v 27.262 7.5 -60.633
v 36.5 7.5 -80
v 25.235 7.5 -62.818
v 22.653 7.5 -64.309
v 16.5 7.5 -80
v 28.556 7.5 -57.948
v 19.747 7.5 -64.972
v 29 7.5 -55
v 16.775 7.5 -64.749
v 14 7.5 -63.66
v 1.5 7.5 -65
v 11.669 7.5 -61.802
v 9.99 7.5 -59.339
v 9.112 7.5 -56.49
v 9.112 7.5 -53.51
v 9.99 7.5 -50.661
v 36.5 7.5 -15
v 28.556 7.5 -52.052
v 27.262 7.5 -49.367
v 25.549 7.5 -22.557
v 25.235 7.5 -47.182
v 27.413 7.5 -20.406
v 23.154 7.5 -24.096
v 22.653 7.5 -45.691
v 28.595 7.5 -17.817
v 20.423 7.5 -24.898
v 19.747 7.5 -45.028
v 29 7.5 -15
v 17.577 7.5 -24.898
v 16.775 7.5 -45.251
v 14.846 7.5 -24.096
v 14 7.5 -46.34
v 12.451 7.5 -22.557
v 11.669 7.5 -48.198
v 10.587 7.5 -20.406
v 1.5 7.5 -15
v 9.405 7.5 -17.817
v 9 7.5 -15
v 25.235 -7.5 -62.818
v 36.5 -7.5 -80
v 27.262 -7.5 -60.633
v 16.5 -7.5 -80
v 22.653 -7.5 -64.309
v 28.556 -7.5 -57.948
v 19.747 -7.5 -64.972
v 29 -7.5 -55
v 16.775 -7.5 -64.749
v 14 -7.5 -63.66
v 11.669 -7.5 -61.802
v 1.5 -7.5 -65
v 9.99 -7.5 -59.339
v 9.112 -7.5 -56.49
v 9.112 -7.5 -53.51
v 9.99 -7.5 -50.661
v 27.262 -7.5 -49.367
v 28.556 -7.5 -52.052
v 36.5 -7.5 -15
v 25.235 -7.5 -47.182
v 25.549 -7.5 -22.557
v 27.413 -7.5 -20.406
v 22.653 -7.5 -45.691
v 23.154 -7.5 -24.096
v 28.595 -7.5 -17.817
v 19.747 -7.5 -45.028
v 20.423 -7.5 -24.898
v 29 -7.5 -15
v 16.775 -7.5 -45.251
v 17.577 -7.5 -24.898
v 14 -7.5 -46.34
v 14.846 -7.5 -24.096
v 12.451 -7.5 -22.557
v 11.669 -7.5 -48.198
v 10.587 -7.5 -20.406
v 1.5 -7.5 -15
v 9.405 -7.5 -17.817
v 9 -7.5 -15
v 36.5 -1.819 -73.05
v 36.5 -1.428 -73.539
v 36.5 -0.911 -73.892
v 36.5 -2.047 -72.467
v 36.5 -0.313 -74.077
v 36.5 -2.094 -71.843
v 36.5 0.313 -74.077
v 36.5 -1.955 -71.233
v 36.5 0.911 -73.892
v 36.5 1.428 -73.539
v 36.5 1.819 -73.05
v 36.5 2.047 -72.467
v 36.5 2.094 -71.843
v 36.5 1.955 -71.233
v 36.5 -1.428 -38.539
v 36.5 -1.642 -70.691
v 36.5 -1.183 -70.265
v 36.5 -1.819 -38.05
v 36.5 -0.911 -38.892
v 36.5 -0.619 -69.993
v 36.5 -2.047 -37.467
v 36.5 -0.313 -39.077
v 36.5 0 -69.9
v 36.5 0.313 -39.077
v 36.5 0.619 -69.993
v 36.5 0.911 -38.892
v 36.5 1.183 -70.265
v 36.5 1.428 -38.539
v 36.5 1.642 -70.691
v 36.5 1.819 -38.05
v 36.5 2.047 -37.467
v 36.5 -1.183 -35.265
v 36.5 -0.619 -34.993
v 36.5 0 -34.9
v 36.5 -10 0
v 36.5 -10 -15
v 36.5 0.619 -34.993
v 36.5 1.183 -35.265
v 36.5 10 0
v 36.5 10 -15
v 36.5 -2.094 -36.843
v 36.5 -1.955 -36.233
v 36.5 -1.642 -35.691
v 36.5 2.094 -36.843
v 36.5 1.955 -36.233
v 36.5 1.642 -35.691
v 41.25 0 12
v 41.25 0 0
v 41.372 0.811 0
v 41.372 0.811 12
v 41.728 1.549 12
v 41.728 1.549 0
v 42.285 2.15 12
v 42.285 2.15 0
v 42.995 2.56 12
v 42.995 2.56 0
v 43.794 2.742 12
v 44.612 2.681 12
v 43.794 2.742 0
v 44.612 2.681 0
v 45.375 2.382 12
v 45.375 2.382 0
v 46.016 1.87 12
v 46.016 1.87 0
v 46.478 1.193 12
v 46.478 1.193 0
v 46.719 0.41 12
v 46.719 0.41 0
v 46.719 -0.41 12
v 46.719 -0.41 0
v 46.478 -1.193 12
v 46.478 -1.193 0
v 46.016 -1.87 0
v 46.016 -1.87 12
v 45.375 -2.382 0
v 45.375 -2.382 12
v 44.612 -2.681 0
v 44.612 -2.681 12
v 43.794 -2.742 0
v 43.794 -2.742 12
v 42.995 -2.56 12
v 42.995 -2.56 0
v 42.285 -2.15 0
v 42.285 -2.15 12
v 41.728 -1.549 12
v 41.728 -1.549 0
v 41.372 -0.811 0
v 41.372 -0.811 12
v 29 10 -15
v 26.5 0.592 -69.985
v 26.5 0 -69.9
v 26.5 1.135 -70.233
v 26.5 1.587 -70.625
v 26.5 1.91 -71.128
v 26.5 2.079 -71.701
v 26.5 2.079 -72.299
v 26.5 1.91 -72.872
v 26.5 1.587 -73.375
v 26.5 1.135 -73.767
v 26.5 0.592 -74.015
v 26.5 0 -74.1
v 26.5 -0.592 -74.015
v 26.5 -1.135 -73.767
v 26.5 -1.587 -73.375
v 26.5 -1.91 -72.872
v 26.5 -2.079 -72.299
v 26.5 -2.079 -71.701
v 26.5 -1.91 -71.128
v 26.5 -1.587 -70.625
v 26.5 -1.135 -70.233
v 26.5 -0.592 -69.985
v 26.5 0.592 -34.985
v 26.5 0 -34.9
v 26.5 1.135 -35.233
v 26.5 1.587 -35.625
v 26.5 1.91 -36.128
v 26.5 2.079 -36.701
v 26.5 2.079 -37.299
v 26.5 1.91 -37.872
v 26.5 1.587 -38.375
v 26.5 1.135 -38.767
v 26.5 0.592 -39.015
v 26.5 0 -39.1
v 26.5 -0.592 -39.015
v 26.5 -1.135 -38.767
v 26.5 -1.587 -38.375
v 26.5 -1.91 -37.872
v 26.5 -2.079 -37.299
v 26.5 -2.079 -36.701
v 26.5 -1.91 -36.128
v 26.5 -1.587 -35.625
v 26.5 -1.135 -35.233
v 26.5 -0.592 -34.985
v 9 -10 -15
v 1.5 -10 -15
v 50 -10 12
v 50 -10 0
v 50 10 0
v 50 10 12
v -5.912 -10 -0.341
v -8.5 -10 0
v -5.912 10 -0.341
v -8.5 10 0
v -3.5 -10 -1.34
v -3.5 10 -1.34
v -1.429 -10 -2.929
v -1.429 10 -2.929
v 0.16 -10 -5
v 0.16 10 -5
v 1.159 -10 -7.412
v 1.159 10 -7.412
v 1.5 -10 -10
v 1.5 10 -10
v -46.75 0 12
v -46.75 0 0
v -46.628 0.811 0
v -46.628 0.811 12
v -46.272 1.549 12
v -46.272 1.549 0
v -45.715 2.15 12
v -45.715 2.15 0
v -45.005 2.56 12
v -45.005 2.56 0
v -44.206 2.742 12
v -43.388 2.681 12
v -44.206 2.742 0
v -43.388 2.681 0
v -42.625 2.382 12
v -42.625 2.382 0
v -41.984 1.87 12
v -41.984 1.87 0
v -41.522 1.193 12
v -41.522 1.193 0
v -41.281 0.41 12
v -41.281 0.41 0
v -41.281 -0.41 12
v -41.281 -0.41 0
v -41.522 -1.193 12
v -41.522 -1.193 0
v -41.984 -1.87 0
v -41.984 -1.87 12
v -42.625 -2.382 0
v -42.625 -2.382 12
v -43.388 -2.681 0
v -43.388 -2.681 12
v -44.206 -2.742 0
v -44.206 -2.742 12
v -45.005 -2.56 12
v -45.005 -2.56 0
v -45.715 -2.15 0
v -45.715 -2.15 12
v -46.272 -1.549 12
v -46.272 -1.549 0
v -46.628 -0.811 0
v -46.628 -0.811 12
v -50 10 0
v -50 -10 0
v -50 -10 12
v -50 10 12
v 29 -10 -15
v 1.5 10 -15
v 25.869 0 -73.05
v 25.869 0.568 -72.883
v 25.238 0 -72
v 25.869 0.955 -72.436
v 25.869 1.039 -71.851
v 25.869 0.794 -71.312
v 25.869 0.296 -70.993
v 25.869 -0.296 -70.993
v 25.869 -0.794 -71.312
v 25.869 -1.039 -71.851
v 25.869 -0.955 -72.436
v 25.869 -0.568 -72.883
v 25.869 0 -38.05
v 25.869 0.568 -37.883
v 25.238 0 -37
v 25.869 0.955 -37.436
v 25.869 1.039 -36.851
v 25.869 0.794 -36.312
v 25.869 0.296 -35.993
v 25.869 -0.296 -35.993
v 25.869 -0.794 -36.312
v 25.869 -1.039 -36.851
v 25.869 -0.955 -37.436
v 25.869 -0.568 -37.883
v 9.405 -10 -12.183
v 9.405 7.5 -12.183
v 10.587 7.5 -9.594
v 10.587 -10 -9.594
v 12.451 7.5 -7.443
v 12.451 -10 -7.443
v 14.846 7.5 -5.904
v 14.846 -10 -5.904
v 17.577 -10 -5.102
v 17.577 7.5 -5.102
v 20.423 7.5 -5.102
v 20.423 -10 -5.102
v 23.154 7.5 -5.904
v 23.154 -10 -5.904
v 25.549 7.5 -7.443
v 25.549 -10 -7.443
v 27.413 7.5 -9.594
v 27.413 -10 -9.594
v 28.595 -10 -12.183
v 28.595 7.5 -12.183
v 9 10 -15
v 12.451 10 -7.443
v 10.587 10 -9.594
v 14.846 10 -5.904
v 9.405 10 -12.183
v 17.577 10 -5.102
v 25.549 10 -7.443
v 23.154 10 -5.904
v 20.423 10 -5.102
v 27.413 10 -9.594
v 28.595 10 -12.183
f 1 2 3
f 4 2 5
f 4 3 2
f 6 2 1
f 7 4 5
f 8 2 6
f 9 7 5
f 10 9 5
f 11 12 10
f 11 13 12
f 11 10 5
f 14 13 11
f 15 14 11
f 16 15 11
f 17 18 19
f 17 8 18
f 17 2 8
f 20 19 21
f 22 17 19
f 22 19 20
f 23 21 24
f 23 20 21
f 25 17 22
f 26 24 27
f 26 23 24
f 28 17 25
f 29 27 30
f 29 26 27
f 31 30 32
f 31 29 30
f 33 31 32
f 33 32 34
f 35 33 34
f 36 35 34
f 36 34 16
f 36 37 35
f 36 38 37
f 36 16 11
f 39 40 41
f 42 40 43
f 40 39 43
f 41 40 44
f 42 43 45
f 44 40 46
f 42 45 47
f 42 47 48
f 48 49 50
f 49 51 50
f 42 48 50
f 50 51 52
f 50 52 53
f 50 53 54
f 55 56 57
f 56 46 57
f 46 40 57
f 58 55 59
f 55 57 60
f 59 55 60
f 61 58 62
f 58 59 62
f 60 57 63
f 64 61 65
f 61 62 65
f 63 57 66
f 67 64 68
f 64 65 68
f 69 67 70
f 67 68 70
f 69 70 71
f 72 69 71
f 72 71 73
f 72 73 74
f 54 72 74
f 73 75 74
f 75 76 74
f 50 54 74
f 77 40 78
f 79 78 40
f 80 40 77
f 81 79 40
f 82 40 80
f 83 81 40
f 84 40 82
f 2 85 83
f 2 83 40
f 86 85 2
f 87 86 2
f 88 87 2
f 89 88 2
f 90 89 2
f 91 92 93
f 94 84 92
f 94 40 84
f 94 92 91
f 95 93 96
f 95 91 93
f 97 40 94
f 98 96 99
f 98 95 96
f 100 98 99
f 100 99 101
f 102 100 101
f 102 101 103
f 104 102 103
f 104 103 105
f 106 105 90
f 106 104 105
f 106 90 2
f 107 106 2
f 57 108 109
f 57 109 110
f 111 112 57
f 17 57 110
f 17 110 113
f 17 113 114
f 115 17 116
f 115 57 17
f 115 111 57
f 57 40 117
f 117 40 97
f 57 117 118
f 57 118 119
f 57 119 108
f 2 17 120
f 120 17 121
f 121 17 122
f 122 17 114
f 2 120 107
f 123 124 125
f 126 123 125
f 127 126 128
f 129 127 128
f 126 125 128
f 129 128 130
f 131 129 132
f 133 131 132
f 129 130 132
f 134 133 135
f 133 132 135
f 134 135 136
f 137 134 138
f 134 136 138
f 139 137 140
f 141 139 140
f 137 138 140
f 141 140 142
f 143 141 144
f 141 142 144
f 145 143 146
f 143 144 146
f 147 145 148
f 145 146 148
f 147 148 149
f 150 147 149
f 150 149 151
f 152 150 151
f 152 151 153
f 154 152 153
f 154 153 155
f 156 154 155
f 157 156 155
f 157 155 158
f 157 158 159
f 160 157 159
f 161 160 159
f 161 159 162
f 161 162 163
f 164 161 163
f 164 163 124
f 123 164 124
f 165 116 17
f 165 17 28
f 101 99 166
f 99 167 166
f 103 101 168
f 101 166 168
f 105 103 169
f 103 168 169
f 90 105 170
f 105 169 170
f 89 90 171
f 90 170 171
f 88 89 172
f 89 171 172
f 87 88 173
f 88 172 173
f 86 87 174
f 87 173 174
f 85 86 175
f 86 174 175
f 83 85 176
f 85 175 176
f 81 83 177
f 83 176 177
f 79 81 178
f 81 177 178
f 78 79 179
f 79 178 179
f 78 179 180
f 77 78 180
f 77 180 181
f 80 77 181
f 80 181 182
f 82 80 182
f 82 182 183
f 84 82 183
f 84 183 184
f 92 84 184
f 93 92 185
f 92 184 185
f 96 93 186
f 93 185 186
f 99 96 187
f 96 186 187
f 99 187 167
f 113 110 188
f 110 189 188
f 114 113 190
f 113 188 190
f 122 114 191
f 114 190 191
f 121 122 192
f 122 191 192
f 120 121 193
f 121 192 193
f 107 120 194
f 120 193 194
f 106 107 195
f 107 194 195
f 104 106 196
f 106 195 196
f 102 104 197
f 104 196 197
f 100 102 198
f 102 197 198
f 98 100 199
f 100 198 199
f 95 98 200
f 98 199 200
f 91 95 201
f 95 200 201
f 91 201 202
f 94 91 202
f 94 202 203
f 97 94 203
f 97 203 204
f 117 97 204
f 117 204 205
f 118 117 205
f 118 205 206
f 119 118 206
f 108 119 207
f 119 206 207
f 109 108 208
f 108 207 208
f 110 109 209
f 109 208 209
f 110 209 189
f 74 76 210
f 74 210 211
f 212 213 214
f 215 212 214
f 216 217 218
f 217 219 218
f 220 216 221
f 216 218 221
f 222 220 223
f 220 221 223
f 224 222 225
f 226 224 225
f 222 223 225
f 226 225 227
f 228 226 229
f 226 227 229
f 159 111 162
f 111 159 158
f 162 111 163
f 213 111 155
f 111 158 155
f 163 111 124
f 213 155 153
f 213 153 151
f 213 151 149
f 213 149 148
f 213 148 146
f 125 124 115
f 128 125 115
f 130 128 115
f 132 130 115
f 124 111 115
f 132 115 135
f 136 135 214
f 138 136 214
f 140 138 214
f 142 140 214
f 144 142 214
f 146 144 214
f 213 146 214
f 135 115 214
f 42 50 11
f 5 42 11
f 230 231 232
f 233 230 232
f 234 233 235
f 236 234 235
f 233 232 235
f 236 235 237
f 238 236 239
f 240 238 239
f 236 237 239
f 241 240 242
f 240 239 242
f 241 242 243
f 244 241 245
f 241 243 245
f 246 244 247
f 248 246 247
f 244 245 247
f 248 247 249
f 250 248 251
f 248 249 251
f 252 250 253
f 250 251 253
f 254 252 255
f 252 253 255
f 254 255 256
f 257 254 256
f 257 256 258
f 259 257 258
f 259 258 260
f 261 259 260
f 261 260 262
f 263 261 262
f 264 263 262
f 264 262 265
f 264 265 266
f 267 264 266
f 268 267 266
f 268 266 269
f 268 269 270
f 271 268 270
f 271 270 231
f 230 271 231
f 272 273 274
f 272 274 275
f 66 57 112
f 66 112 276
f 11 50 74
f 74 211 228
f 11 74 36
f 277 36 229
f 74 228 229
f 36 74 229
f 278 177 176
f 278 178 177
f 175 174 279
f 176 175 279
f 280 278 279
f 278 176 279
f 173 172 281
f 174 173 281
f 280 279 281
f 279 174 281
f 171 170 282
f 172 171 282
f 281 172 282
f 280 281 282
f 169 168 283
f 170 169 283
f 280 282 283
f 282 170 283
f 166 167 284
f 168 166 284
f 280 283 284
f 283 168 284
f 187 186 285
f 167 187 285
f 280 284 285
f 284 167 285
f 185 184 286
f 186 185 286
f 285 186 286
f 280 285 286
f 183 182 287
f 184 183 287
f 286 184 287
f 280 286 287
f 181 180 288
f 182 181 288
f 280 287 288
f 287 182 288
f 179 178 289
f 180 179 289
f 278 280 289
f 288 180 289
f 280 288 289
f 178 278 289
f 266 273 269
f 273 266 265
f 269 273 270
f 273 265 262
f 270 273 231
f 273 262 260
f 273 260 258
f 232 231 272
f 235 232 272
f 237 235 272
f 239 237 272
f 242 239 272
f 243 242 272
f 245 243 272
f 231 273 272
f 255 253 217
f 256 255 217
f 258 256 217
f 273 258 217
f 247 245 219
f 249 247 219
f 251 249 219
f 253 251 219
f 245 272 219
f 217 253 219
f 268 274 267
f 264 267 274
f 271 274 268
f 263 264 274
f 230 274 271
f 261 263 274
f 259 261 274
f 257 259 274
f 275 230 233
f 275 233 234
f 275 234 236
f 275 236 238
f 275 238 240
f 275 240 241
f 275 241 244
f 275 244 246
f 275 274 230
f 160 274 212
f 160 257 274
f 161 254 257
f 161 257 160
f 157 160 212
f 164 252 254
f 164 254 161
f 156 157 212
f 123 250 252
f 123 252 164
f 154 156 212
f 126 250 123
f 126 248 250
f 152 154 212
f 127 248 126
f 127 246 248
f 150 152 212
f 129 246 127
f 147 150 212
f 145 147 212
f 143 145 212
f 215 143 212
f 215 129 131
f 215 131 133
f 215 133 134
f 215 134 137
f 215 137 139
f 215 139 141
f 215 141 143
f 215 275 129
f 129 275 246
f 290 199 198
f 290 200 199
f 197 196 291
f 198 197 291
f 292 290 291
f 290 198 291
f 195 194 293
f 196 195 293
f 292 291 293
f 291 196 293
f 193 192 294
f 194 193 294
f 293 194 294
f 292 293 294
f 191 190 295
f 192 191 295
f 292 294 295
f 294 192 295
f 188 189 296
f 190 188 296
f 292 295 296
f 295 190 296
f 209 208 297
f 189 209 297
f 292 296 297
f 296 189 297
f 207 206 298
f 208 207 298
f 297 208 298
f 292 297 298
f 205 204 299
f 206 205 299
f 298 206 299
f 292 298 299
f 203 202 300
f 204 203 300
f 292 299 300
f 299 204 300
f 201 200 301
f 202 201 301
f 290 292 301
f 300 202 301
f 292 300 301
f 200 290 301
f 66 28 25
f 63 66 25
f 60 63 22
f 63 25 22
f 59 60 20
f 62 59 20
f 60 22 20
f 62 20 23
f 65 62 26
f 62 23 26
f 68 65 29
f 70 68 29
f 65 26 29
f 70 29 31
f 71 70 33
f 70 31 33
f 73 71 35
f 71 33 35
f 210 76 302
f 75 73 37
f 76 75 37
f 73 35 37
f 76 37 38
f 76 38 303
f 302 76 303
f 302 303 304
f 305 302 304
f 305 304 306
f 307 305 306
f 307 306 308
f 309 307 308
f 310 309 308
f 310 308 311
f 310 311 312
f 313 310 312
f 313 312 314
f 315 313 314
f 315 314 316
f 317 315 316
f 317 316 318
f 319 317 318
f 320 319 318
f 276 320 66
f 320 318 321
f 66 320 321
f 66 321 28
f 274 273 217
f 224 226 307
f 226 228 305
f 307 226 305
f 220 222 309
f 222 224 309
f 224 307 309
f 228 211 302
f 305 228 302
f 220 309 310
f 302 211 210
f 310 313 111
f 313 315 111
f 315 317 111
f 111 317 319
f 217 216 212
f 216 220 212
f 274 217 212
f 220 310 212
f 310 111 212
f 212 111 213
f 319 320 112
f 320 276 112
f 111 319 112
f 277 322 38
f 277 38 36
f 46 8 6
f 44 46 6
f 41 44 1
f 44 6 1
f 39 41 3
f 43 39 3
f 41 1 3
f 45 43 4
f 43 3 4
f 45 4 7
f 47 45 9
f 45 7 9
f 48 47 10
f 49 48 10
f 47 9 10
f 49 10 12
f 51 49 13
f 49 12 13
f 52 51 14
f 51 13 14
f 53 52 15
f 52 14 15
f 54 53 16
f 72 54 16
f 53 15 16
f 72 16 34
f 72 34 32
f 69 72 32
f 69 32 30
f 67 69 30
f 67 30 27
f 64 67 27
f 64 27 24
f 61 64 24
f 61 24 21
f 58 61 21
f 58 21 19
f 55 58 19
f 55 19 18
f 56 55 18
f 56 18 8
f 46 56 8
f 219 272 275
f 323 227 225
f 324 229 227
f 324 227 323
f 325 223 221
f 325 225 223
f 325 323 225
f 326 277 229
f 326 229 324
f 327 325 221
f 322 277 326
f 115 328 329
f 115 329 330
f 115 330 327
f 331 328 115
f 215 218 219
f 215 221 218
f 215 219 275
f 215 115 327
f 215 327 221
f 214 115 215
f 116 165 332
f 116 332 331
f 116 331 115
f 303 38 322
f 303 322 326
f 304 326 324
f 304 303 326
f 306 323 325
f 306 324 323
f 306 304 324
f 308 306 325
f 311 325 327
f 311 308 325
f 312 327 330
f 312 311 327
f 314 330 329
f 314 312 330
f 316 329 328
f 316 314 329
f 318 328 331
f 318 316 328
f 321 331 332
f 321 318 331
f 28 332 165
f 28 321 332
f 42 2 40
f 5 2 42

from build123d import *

# Parameters (mm, degrees)
SKETCH1_W               = 100
SKETCH1_H               = 20
BOSS_EXTRUDE1_DEPTH     = 12
SKETCH2_W               = 35
SKETCH2_H               = 20
BOSS_EXTRUDE3_DEPTH     = 15
SKETCH3_W               = 35
SKETCH3_H               = 15
BOSS_EXTRUDE4_DEPTH     = 65
FILLET1_R               = 10
CHAMFER1_SIZE           = 15
SKETCH4_R               = 10
CUT_EXTRUDE1_DEPTH      = 65
CUT_EXTRUDE1_DEPTH_BACK = 65
M5_TAPPED_HOLE1_D       = 4.2
M5_TAPPED_HOLE1_DEPTH   = 10
M5_TAPPED_HOLE1_TIP     = 1.2618073
SKETCH7_R               = 2.75
CUT_EXTRUDE2_DEPTH      = 65


with BuildPart() as part:
    # Sketch1 → Boss-Extrude1 (new body)
    with BuildSketch(Plane.XY):
        Rectangle(SKETCH1_W, SKETCH1_H)
    extrude(amount=BOSS_EXTRUDE1_DEPTH)

    # Sketch2 → Boss-Extrude3 (add)
    with BuildSketch(Plane(origin=(0, 0, 0), x_dir=(-1, 0, 0), z_dir=(0, 0, -1))):
        with Locations((-19, 0)):
            Rectangle(SKETCH2_W, SKETCH2_H)
    extrude(amount=BOSS_EXTRUDE3_DEPTH)

    # Sketch3 → Boss-Extrude4 (add)
    with BuildSketch(Plane(origin=(0, 0, -15), x_dir=(-1, 0, 0), z_dir=(0, 0, -1))):
        with Locations((-19, 0)):
            Rectangle(SKETCH3_W, SKETCH3_H)
    extrude(amount=BOSS_EXTRUDE4_DEPTH)

    # Fillet1
    fillet1_edges = [part.edges().sort_by_distance(p)[0] for p in [
        (1.5, 0, 0),
    ]]
    fillet(fillet1_edges, radius=FILLET1_R)

    # Chamfer1
    chamfer1_edges = [part.edges().sort_by_distance(p)[0] for p in [
        (1.5, 0, -80),
    ]]
    chamfer(chamfer1_edges, length=CHAMFER1_SIZE)

    # Sketch4 → Cut-Extrude1 (cut, two sides)
    with BuildSketch(Plane(origin=(0, 7.5, 0), x_dir=(1, 0, 0), z_dir=(0, 1, 0))) as cut_extrude1_sk:
        with Locations((19, 15)):
            Circle(SKETCH4_R)
        with Locations((19, 55)):
            Circle(SKETCH4_R)
    extrude(amount=CUT_EXTRUDE1_DEPTH, mode=Mode.SUBTRACT)
    extrude(cut_extrude1_sk.sketch, amount=-CUT_EXTRUDE1_DEPTH_BACK, mode=Mode.SUBTRACT)

    # M5 Tapped Hole1
    with Locations(Plane(origin=(36.5, 0, 0), x_dir=(0, 0, -1), z_dir=(1, 0, 0))):
        with Locations((72, 0), (37, 0)):
            Hole(M5_TAPPED_HOLE1_D / 2, depth=M5_TAPPED_HOLE1_DEPTH)
            with Locations((0, 0, -(M5_TAPPED_HOLE1_DEPTH + M5_TAPPED_HOLE1_TIP / 2))):  # 118° drill point
                Cone(0, M5_TAPPED_HOLE1_D / 2, M5_TAPPED_HOLE1_TIP, mode=Mode.SUBTRACT)

    # Sketch7 → Cut-Extrude2 (cut)
    with BuildSketch(Plane(origin=(0, 0, 0), x_dir=(-1, 0, 0), z_dir=(0, 0, -1))):
        with Locations((44, 0)):
            Circle(SKETCH7_R)
        with Locations((-44, 0)):
            Circle(SKETCH7_R)
    extrude(amount=-CUT_EXTRUDE2_DEPTH, mode=Mode.SUBTRACT)


solid = part.part
